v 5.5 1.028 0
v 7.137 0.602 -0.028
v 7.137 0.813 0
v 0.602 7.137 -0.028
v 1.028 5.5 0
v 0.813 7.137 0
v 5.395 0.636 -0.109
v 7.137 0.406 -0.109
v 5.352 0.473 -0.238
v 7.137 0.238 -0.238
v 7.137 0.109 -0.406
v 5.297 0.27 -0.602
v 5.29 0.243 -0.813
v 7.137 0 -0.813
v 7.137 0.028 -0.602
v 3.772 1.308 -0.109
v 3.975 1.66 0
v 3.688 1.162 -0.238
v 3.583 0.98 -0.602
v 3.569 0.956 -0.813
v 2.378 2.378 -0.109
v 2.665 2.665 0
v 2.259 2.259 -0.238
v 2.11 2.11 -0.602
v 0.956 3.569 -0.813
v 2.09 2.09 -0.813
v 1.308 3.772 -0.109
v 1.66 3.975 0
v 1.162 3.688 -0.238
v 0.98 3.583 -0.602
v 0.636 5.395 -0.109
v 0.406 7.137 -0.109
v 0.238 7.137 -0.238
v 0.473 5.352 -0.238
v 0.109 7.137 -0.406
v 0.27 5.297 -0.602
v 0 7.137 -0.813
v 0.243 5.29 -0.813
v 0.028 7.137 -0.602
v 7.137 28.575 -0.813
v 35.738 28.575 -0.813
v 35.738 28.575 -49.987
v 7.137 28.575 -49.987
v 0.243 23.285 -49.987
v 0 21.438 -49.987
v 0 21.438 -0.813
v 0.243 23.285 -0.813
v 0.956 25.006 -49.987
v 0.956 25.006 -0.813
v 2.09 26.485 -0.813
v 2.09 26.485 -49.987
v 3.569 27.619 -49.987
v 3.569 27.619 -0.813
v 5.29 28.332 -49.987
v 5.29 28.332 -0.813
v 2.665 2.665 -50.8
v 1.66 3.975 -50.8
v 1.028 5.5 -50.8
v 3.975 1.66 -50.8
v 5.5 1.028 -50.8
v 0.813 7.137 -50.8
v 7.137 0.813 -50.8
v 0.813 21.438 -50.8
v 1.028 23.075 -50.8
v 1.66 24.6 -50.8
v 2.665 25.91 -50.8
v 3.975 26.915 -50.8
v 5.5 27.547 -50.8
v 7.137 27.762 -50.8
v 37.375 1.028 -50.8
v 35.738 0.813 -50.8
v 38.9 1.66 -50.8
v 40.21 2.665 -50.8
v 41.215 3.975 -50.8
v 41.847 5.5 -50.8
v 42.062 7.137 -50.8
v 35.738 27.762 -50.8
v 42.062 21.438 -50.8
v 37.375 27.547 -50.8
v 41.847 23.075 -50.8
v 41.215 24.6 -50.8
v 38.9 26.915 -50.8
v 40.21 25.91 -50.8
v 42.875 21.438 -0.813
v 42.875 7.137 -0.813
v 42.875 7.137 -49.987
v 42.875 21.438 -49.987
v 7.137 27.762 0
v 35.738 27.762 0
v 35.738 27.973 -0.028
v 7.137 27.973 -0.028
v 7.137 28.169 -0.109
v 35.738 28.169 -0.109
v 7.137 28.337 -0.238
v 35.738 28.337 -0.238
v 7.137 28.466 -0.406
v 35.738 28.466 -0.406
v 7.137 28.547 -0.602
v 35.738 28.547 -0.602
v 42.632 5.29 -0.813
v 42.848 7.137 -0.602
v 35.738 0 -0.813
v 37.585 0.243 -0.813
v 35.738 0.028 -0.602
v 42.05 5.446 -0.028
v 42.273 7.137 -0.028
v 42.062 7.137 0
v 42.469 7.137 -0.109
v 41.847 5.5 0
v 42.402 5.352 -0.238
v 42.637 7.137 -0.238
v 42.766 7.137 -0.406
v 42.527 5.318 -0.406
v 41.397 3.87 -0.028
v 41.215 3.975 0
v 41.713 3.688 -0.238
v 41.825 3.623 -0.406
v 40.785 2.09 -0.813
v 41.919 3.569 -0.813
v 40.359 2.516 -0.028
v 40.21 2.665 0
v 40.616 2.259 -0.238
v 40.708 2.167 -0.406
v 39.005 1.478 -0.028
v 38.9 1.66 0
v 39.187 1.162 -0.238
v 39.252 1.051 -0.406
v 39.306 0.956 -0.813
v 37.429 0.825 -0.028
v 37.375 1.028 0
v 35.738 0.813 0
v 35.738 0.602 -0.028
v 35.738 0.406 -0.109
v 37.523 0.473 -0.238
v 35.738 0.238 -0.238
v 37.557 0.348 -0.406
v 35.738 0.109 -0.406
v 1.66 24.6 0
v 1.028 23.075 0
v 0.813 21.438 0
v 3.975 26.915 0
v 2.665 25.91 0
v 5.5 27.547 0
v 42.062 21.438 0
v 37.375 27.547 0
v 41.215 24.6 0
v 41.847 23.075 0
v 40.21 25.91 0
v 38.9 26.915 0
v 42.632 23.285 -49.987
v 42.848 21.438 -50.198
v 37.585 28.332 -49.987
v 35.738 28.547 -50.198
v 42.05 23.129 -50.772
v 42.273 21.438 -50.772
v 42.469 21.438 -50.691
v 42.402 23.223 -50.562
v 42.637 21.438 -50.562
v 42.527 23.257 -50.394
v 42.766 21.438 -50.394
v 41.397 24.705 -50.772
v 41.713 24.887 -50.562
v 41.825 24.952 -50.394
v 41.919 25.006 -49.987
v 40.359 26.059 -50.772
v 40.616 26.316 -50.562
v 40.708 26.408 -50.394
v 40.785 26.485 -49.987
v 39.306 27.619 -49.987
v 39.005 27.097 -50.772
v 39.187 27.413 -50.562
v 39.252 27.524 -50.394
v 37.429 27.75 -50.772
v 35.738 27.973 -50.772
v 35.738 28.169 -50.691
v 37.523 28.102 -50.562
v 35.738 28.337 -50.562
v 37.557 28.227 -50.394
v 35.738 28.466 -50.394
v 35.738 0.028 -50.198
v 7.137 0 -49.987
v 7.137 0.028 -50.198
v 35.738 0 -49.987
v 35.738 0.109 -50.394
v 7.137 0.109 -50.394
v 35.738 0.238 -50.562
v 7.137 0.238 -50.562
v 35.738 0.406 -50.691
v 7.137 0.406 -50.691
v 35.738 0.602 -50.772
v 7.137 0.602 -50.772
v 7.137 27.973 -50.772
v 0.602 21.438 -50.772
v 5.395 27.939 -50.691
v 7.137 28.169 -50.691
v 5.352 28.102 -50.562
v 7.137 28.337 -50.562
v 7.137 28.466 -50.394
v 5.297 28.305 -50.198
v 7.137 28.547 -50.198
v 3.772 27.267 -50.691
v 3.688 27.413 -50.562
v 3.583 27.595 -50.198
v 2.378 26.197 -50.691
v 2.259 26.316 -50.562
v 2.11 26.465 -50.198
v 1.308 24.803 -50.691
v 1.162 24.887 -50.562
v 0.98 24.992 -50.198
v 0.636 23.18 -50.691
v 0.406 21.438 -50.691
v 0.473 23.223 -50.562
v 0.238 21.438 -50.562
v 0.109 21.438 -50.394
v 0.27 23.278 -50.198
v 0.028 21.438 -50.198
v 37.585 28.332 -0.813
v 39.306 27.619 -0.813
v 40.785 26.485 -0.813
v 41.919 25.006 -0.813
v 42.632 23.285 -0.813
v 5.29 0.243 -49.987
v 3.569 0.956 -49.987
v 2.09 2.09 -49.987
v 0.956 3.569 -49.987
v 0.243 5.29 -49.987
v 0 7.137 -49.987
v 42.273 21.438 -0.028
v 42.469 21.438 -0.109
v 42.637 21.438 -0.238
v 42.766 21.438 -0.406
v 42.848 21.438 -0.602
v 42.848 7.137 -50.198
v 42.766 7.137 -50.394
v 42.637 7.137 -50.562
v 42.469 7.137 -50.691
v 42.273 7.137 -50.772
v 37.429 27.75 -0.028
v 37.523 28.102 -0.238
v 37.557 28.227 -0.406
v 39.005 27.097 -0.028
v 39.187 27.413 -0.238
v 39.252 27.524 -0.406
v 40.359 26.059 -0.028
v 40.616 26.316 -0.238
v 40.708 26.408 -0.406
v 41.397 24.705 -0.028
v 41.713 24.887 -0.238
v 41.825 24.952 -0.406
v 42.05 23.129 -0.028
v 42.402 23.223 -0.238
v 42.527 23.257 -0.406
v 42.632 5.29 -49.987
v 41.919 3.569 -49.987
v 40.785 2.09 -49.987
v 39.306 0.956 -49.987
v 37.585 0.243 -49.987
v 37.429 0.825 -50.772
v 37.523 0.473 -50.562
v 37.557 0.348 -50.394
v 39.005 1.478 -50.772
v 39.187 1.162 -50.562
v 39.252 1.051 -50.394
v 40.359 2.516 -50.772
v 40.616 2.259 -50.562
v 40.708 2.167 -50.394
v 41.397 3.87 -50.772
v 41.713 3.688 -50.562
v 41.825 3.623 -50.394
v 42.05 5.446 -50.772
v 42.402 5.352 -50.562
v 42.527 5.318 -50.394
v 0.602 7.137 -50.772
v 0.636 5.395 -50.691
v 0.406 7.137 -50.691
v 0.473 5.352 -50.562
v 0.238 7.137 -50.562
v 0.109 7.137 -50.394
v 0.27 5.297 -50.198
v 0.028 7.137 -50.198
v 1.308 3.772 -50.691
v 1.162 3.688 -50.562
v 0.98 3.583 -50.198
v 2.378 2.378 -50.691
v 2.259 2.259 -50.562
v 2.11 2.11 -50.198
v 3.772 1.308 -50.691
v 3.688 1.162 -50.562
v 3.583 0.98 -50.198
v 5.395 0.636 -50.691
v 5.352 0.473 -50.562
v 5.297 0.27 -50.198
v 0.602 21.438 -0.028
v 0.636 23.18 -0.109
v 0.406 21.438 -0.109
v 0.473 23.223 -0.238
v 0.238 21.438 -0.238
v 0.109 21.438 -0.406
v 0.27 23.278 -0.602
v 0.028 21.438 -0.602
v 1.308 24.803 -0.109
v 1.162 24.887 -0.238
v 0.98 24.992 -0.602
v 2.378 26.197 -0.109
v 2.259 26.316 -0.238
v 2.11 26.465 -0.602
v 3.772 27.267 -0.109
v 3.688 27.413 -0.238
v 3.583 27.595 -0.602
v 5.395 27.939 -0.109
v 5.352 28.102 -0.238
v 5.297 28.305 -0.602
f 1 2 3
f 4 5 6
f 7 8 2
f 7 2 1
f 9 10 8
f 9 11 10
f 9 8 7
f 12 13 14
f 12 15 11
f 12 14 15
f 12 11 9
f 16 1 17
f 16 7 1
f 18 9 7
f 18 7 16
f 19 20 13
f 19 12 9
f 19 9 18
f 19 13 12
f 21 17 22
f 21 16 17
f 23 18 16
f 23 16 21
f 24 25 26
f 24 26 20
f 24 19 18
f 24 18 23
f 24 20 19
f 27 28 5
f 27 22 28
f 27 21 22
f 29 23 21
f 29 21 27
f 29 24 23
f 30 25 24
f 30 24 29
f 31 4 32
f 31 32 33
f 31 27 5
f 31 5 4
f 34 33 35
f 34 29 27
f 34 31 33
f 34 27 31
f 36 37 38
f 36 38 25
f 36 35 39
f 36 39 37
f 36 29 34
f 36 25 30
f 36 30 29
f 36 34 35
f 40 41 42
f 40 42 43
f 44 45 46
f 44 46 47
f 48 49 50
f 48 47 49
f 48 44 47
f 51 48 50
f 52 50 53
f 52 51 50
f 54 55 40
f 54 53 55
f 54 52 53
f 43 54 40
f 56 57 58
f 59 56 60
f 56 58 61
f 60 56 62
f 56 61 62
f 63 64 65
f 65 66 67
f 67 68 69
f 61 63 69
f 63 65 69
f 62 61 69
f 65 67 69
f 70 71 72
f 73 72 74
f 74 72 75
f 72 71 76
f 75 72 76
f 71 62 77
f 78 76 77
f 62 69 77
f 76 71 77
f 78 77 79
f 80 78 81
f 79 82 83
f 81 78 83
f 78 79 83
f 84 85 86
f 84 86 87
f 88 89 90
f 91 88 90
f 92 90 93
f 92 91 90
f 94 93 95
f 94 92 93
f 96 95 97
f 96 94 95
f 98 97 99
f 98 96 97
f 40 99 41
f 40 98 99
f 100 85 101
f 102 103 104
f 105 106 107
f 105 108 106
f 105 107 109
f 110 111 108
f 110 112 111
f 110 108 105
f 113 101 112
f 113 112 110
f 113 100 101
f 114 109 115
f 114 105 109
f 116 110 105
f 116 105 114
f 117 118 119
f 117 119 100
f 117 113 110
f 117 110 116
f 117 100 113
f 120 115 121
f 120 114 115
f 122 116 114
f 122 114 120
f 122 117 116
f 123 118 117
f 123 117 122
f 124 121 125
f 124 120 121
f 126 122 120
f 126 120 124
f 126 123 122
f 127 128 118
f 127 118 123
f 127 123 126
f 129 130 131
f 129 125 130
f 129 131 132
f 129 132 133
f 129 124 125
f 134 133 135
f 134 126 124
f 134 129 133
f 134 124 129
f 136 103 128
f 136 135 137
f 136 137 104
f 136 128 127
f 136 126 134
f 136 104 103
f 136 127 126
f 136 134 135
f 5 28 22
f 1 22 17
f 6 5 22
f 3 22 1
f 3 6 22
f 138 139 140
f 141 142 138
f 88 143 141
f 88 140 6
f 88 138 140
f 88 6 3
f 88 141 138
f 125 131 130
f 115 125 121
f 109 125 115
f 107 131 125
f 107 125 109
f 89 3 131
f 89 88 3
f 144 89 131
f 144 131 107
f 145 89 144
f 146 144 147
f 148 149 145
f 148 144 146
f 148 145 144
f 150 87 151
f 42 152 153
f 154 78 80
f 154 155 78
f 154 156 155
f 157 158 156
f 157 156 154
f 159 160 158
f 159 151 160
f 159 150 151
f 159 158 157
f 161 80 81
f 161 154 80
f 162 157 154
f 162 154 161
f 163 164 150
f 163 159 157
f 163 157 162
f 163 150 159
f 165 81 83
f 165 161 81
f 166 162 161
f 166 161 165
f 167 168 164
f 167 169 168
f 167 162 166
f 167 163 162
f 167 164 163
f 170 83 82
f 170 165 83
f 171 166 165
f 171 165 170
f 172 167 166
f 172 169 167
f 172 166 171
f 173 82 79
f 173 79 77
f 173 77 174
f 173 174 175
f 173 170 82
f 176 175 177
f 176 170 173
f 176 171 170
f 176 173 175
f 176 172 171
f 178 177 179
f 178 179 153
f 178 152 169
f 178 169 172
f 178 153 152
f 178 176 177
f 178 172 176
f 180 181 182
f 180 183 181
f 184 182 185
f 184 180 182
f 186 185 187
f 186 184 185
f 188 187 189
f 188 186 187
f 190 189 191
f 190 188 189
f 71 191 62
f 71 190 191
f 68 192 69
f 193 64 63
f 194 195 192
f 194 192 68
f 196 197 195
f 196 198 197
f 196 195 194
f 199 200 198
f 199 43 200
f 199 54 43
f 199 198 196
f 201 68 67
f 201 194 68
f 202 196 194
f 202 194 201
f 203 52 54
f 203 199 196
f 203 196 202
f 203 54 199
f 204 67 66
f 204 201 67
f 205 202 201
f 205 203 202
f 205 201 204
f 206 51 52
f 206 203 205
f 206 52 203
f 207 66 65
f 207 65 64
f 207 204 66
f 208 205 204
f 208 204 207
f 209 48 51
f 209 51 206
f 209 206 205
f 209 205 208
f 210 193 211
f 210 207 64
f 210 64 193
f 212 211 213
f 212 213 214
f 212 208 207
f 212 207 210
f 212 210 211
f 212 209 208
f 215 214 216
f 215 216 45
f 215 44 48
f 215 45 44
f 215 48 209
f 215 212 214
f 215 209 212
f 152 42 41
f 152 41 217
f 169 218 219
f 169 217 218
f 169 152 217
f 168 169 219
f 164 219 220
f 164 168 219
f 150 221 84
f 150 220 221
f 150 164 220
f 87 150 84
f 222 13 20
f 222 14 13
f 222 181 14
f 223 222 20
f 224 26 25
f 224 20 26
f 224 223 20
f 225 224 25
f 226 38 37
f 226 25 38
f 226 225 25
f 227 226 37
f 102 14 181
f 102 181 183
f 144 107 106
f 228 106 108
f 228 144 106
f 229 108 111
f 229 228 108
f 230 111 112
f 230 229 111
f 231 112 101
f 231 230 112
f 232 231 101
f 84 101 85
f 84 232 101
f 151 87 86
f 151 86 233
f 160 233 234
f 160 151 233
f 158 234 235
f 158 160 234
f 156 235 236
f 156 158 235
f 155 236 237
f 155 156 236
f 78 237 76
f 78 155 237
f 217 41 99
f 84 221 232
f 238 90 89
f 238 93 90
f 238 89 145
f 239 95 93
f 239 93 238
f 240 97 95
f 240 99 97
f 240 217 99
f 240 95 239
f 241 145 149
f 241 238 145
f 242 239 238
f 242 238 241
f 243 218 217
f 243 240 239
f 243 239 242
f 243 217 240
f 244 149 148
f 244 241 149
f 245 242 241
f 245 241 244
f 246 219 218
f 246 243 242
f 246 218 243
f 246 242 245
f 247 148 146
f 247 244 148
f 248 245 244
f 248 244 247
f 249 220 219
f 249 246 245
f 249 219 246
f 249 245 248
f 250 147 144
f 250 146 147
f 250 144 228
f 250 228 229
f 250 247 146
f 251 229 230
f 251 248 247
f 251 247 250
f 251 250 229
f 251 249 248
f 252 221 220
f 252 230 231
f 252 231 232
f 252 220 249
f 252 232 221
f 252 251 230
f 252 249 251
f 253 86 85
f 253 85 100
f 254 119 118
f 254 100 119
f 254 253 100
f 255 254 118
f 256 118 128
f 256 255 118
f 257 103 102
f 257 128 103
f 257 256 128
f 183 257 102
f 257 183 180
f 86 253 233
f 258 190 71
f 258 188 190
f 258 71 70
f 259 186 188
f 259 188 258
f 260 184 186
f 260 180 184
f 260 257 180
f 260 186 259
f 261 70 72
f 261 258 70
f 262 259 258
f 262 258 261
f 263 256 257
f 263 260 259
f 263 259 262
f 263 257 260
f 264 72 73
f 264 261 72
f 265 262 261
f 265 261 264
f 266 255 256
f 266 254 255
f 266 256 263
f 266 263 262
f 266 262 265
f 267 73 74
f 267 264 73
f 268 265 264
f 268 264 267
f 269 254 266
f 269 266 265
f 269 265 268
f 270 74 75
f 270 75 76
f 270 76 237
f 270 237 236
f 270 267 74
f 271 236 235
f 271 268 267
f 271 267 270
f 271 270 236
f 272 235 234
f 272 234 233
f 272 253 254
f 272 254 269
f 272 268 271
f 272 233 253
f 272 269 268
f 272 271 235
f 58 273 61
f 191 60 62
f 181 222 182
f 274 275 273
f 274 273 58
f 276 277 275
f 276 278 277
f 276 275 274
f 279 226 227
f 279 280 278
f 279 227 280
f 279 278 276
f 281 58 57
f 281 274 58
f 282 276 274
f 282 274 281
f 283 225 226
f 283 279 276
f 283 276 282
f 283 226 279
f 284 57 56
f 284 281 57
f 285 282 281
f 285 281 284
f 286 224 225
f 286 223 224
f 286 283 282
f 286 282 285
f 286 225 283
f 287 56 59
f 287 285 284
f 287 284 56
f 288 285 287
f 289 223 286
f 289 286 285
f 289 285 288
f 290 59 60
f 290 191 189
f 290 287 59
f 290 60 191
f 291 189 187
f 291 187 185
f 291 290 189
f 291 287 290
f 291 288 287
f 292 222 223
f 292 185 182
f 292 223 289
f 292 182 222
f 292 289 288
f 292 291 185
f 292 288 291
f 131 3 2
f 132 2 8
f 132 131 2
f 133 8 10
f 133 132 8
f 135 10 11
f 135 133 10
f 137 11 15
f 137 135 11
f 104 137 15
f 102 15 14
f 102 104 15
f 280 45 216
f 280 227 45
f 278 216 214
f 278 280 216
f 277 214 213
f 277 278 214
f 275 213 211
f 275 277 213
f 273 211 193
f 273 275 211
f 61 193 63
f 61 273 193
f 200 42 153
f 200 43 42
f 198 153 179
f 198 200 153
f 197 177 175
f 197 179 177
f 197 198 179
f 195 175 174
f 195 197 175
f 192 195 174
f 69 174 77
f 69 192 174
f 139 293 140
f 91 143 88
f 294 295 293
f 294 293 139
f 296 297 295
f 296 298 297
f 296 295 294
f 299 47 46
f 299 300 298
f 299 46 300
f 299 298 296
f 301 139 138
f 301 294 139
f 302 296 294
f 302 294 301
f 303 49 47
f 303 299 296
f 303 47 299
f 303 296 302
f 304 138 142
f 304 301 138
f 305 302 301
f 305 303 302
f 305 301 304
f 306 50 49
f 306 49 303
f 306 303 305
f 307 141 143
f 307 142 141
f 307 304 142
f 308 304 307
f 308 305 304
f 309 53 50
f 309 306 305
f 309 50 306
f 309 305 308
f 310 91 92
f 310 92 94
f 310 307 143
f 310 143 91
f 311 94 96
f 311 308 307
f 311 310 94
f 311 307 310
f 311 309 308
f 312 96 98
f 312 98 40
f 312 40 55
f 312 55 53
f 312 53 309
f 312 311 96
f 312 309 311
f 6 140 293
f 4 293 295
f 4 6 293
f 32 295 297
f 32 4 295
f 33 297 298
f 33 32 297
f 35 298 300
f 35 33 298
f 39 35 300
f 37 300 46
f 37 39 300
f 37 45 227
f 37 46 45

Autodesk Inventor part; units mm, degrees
ref_plane "YZ Plane" through (0, 0, 0) normal (1, 0, 0) x (0, 1, 0)
ref_plane "XZ Plane" through (0, 0, 0) normal (0, 1, 0) x (-1, 0, 0)
ref_plane "XY Plane" through (0, 0, 0) normal (0, 0, 1) x (1, 0, 0)
sketch "Sketch1" plane through (0, 0, 0) normal (0, 0, 1) x (1, 0, 0)
  line L0 (0, 0) -> (42.8752, 0)
  line L1 (42.8752, 0) -> (42.8752, 28.575)
  line L2 (42.8752, 28.575) -> (0, 28.575)
  line L3 (0, 28.575) -> (0, 0)
  dimension "d0" = 42.8752
  dimension "d1" = 28.575
extrude "Extrusion1" add sketch "Sketch1" against normal blind 50.8
fillet "Fillet1" radius 7.1374 4 edges at (42.8752, 28.575, -25.4) (0, 28.575, -25.4) (0, 0, -25.4) (42.8752, 0, -25.4)
fillet "Fillet2" radius 0.8128 16 edges at (21.4376, 28.575, 0) (2.0905, 26.4845, 0) (0, 14.2875, 0) (2.0905, 2.0905, 0) (21.4376, 0, 0) (40.7847, 2.0905, 0) (42.8752, 14.2875, 0) (40.7847, 26.4845, 0) (21.4376, 28.575, -50.8) (2.0905, 26.4845, -50.8) (0, 14.2875, -50.8) (2.0905, 2.0905, -50.8) (21.4376, 0, -50.8) (40.7847, 2.0905, -50.8) (42.8752, 14.2875, -50.8) (40.7847, 26.4845, -50.8)
properties part number "276-1456"
